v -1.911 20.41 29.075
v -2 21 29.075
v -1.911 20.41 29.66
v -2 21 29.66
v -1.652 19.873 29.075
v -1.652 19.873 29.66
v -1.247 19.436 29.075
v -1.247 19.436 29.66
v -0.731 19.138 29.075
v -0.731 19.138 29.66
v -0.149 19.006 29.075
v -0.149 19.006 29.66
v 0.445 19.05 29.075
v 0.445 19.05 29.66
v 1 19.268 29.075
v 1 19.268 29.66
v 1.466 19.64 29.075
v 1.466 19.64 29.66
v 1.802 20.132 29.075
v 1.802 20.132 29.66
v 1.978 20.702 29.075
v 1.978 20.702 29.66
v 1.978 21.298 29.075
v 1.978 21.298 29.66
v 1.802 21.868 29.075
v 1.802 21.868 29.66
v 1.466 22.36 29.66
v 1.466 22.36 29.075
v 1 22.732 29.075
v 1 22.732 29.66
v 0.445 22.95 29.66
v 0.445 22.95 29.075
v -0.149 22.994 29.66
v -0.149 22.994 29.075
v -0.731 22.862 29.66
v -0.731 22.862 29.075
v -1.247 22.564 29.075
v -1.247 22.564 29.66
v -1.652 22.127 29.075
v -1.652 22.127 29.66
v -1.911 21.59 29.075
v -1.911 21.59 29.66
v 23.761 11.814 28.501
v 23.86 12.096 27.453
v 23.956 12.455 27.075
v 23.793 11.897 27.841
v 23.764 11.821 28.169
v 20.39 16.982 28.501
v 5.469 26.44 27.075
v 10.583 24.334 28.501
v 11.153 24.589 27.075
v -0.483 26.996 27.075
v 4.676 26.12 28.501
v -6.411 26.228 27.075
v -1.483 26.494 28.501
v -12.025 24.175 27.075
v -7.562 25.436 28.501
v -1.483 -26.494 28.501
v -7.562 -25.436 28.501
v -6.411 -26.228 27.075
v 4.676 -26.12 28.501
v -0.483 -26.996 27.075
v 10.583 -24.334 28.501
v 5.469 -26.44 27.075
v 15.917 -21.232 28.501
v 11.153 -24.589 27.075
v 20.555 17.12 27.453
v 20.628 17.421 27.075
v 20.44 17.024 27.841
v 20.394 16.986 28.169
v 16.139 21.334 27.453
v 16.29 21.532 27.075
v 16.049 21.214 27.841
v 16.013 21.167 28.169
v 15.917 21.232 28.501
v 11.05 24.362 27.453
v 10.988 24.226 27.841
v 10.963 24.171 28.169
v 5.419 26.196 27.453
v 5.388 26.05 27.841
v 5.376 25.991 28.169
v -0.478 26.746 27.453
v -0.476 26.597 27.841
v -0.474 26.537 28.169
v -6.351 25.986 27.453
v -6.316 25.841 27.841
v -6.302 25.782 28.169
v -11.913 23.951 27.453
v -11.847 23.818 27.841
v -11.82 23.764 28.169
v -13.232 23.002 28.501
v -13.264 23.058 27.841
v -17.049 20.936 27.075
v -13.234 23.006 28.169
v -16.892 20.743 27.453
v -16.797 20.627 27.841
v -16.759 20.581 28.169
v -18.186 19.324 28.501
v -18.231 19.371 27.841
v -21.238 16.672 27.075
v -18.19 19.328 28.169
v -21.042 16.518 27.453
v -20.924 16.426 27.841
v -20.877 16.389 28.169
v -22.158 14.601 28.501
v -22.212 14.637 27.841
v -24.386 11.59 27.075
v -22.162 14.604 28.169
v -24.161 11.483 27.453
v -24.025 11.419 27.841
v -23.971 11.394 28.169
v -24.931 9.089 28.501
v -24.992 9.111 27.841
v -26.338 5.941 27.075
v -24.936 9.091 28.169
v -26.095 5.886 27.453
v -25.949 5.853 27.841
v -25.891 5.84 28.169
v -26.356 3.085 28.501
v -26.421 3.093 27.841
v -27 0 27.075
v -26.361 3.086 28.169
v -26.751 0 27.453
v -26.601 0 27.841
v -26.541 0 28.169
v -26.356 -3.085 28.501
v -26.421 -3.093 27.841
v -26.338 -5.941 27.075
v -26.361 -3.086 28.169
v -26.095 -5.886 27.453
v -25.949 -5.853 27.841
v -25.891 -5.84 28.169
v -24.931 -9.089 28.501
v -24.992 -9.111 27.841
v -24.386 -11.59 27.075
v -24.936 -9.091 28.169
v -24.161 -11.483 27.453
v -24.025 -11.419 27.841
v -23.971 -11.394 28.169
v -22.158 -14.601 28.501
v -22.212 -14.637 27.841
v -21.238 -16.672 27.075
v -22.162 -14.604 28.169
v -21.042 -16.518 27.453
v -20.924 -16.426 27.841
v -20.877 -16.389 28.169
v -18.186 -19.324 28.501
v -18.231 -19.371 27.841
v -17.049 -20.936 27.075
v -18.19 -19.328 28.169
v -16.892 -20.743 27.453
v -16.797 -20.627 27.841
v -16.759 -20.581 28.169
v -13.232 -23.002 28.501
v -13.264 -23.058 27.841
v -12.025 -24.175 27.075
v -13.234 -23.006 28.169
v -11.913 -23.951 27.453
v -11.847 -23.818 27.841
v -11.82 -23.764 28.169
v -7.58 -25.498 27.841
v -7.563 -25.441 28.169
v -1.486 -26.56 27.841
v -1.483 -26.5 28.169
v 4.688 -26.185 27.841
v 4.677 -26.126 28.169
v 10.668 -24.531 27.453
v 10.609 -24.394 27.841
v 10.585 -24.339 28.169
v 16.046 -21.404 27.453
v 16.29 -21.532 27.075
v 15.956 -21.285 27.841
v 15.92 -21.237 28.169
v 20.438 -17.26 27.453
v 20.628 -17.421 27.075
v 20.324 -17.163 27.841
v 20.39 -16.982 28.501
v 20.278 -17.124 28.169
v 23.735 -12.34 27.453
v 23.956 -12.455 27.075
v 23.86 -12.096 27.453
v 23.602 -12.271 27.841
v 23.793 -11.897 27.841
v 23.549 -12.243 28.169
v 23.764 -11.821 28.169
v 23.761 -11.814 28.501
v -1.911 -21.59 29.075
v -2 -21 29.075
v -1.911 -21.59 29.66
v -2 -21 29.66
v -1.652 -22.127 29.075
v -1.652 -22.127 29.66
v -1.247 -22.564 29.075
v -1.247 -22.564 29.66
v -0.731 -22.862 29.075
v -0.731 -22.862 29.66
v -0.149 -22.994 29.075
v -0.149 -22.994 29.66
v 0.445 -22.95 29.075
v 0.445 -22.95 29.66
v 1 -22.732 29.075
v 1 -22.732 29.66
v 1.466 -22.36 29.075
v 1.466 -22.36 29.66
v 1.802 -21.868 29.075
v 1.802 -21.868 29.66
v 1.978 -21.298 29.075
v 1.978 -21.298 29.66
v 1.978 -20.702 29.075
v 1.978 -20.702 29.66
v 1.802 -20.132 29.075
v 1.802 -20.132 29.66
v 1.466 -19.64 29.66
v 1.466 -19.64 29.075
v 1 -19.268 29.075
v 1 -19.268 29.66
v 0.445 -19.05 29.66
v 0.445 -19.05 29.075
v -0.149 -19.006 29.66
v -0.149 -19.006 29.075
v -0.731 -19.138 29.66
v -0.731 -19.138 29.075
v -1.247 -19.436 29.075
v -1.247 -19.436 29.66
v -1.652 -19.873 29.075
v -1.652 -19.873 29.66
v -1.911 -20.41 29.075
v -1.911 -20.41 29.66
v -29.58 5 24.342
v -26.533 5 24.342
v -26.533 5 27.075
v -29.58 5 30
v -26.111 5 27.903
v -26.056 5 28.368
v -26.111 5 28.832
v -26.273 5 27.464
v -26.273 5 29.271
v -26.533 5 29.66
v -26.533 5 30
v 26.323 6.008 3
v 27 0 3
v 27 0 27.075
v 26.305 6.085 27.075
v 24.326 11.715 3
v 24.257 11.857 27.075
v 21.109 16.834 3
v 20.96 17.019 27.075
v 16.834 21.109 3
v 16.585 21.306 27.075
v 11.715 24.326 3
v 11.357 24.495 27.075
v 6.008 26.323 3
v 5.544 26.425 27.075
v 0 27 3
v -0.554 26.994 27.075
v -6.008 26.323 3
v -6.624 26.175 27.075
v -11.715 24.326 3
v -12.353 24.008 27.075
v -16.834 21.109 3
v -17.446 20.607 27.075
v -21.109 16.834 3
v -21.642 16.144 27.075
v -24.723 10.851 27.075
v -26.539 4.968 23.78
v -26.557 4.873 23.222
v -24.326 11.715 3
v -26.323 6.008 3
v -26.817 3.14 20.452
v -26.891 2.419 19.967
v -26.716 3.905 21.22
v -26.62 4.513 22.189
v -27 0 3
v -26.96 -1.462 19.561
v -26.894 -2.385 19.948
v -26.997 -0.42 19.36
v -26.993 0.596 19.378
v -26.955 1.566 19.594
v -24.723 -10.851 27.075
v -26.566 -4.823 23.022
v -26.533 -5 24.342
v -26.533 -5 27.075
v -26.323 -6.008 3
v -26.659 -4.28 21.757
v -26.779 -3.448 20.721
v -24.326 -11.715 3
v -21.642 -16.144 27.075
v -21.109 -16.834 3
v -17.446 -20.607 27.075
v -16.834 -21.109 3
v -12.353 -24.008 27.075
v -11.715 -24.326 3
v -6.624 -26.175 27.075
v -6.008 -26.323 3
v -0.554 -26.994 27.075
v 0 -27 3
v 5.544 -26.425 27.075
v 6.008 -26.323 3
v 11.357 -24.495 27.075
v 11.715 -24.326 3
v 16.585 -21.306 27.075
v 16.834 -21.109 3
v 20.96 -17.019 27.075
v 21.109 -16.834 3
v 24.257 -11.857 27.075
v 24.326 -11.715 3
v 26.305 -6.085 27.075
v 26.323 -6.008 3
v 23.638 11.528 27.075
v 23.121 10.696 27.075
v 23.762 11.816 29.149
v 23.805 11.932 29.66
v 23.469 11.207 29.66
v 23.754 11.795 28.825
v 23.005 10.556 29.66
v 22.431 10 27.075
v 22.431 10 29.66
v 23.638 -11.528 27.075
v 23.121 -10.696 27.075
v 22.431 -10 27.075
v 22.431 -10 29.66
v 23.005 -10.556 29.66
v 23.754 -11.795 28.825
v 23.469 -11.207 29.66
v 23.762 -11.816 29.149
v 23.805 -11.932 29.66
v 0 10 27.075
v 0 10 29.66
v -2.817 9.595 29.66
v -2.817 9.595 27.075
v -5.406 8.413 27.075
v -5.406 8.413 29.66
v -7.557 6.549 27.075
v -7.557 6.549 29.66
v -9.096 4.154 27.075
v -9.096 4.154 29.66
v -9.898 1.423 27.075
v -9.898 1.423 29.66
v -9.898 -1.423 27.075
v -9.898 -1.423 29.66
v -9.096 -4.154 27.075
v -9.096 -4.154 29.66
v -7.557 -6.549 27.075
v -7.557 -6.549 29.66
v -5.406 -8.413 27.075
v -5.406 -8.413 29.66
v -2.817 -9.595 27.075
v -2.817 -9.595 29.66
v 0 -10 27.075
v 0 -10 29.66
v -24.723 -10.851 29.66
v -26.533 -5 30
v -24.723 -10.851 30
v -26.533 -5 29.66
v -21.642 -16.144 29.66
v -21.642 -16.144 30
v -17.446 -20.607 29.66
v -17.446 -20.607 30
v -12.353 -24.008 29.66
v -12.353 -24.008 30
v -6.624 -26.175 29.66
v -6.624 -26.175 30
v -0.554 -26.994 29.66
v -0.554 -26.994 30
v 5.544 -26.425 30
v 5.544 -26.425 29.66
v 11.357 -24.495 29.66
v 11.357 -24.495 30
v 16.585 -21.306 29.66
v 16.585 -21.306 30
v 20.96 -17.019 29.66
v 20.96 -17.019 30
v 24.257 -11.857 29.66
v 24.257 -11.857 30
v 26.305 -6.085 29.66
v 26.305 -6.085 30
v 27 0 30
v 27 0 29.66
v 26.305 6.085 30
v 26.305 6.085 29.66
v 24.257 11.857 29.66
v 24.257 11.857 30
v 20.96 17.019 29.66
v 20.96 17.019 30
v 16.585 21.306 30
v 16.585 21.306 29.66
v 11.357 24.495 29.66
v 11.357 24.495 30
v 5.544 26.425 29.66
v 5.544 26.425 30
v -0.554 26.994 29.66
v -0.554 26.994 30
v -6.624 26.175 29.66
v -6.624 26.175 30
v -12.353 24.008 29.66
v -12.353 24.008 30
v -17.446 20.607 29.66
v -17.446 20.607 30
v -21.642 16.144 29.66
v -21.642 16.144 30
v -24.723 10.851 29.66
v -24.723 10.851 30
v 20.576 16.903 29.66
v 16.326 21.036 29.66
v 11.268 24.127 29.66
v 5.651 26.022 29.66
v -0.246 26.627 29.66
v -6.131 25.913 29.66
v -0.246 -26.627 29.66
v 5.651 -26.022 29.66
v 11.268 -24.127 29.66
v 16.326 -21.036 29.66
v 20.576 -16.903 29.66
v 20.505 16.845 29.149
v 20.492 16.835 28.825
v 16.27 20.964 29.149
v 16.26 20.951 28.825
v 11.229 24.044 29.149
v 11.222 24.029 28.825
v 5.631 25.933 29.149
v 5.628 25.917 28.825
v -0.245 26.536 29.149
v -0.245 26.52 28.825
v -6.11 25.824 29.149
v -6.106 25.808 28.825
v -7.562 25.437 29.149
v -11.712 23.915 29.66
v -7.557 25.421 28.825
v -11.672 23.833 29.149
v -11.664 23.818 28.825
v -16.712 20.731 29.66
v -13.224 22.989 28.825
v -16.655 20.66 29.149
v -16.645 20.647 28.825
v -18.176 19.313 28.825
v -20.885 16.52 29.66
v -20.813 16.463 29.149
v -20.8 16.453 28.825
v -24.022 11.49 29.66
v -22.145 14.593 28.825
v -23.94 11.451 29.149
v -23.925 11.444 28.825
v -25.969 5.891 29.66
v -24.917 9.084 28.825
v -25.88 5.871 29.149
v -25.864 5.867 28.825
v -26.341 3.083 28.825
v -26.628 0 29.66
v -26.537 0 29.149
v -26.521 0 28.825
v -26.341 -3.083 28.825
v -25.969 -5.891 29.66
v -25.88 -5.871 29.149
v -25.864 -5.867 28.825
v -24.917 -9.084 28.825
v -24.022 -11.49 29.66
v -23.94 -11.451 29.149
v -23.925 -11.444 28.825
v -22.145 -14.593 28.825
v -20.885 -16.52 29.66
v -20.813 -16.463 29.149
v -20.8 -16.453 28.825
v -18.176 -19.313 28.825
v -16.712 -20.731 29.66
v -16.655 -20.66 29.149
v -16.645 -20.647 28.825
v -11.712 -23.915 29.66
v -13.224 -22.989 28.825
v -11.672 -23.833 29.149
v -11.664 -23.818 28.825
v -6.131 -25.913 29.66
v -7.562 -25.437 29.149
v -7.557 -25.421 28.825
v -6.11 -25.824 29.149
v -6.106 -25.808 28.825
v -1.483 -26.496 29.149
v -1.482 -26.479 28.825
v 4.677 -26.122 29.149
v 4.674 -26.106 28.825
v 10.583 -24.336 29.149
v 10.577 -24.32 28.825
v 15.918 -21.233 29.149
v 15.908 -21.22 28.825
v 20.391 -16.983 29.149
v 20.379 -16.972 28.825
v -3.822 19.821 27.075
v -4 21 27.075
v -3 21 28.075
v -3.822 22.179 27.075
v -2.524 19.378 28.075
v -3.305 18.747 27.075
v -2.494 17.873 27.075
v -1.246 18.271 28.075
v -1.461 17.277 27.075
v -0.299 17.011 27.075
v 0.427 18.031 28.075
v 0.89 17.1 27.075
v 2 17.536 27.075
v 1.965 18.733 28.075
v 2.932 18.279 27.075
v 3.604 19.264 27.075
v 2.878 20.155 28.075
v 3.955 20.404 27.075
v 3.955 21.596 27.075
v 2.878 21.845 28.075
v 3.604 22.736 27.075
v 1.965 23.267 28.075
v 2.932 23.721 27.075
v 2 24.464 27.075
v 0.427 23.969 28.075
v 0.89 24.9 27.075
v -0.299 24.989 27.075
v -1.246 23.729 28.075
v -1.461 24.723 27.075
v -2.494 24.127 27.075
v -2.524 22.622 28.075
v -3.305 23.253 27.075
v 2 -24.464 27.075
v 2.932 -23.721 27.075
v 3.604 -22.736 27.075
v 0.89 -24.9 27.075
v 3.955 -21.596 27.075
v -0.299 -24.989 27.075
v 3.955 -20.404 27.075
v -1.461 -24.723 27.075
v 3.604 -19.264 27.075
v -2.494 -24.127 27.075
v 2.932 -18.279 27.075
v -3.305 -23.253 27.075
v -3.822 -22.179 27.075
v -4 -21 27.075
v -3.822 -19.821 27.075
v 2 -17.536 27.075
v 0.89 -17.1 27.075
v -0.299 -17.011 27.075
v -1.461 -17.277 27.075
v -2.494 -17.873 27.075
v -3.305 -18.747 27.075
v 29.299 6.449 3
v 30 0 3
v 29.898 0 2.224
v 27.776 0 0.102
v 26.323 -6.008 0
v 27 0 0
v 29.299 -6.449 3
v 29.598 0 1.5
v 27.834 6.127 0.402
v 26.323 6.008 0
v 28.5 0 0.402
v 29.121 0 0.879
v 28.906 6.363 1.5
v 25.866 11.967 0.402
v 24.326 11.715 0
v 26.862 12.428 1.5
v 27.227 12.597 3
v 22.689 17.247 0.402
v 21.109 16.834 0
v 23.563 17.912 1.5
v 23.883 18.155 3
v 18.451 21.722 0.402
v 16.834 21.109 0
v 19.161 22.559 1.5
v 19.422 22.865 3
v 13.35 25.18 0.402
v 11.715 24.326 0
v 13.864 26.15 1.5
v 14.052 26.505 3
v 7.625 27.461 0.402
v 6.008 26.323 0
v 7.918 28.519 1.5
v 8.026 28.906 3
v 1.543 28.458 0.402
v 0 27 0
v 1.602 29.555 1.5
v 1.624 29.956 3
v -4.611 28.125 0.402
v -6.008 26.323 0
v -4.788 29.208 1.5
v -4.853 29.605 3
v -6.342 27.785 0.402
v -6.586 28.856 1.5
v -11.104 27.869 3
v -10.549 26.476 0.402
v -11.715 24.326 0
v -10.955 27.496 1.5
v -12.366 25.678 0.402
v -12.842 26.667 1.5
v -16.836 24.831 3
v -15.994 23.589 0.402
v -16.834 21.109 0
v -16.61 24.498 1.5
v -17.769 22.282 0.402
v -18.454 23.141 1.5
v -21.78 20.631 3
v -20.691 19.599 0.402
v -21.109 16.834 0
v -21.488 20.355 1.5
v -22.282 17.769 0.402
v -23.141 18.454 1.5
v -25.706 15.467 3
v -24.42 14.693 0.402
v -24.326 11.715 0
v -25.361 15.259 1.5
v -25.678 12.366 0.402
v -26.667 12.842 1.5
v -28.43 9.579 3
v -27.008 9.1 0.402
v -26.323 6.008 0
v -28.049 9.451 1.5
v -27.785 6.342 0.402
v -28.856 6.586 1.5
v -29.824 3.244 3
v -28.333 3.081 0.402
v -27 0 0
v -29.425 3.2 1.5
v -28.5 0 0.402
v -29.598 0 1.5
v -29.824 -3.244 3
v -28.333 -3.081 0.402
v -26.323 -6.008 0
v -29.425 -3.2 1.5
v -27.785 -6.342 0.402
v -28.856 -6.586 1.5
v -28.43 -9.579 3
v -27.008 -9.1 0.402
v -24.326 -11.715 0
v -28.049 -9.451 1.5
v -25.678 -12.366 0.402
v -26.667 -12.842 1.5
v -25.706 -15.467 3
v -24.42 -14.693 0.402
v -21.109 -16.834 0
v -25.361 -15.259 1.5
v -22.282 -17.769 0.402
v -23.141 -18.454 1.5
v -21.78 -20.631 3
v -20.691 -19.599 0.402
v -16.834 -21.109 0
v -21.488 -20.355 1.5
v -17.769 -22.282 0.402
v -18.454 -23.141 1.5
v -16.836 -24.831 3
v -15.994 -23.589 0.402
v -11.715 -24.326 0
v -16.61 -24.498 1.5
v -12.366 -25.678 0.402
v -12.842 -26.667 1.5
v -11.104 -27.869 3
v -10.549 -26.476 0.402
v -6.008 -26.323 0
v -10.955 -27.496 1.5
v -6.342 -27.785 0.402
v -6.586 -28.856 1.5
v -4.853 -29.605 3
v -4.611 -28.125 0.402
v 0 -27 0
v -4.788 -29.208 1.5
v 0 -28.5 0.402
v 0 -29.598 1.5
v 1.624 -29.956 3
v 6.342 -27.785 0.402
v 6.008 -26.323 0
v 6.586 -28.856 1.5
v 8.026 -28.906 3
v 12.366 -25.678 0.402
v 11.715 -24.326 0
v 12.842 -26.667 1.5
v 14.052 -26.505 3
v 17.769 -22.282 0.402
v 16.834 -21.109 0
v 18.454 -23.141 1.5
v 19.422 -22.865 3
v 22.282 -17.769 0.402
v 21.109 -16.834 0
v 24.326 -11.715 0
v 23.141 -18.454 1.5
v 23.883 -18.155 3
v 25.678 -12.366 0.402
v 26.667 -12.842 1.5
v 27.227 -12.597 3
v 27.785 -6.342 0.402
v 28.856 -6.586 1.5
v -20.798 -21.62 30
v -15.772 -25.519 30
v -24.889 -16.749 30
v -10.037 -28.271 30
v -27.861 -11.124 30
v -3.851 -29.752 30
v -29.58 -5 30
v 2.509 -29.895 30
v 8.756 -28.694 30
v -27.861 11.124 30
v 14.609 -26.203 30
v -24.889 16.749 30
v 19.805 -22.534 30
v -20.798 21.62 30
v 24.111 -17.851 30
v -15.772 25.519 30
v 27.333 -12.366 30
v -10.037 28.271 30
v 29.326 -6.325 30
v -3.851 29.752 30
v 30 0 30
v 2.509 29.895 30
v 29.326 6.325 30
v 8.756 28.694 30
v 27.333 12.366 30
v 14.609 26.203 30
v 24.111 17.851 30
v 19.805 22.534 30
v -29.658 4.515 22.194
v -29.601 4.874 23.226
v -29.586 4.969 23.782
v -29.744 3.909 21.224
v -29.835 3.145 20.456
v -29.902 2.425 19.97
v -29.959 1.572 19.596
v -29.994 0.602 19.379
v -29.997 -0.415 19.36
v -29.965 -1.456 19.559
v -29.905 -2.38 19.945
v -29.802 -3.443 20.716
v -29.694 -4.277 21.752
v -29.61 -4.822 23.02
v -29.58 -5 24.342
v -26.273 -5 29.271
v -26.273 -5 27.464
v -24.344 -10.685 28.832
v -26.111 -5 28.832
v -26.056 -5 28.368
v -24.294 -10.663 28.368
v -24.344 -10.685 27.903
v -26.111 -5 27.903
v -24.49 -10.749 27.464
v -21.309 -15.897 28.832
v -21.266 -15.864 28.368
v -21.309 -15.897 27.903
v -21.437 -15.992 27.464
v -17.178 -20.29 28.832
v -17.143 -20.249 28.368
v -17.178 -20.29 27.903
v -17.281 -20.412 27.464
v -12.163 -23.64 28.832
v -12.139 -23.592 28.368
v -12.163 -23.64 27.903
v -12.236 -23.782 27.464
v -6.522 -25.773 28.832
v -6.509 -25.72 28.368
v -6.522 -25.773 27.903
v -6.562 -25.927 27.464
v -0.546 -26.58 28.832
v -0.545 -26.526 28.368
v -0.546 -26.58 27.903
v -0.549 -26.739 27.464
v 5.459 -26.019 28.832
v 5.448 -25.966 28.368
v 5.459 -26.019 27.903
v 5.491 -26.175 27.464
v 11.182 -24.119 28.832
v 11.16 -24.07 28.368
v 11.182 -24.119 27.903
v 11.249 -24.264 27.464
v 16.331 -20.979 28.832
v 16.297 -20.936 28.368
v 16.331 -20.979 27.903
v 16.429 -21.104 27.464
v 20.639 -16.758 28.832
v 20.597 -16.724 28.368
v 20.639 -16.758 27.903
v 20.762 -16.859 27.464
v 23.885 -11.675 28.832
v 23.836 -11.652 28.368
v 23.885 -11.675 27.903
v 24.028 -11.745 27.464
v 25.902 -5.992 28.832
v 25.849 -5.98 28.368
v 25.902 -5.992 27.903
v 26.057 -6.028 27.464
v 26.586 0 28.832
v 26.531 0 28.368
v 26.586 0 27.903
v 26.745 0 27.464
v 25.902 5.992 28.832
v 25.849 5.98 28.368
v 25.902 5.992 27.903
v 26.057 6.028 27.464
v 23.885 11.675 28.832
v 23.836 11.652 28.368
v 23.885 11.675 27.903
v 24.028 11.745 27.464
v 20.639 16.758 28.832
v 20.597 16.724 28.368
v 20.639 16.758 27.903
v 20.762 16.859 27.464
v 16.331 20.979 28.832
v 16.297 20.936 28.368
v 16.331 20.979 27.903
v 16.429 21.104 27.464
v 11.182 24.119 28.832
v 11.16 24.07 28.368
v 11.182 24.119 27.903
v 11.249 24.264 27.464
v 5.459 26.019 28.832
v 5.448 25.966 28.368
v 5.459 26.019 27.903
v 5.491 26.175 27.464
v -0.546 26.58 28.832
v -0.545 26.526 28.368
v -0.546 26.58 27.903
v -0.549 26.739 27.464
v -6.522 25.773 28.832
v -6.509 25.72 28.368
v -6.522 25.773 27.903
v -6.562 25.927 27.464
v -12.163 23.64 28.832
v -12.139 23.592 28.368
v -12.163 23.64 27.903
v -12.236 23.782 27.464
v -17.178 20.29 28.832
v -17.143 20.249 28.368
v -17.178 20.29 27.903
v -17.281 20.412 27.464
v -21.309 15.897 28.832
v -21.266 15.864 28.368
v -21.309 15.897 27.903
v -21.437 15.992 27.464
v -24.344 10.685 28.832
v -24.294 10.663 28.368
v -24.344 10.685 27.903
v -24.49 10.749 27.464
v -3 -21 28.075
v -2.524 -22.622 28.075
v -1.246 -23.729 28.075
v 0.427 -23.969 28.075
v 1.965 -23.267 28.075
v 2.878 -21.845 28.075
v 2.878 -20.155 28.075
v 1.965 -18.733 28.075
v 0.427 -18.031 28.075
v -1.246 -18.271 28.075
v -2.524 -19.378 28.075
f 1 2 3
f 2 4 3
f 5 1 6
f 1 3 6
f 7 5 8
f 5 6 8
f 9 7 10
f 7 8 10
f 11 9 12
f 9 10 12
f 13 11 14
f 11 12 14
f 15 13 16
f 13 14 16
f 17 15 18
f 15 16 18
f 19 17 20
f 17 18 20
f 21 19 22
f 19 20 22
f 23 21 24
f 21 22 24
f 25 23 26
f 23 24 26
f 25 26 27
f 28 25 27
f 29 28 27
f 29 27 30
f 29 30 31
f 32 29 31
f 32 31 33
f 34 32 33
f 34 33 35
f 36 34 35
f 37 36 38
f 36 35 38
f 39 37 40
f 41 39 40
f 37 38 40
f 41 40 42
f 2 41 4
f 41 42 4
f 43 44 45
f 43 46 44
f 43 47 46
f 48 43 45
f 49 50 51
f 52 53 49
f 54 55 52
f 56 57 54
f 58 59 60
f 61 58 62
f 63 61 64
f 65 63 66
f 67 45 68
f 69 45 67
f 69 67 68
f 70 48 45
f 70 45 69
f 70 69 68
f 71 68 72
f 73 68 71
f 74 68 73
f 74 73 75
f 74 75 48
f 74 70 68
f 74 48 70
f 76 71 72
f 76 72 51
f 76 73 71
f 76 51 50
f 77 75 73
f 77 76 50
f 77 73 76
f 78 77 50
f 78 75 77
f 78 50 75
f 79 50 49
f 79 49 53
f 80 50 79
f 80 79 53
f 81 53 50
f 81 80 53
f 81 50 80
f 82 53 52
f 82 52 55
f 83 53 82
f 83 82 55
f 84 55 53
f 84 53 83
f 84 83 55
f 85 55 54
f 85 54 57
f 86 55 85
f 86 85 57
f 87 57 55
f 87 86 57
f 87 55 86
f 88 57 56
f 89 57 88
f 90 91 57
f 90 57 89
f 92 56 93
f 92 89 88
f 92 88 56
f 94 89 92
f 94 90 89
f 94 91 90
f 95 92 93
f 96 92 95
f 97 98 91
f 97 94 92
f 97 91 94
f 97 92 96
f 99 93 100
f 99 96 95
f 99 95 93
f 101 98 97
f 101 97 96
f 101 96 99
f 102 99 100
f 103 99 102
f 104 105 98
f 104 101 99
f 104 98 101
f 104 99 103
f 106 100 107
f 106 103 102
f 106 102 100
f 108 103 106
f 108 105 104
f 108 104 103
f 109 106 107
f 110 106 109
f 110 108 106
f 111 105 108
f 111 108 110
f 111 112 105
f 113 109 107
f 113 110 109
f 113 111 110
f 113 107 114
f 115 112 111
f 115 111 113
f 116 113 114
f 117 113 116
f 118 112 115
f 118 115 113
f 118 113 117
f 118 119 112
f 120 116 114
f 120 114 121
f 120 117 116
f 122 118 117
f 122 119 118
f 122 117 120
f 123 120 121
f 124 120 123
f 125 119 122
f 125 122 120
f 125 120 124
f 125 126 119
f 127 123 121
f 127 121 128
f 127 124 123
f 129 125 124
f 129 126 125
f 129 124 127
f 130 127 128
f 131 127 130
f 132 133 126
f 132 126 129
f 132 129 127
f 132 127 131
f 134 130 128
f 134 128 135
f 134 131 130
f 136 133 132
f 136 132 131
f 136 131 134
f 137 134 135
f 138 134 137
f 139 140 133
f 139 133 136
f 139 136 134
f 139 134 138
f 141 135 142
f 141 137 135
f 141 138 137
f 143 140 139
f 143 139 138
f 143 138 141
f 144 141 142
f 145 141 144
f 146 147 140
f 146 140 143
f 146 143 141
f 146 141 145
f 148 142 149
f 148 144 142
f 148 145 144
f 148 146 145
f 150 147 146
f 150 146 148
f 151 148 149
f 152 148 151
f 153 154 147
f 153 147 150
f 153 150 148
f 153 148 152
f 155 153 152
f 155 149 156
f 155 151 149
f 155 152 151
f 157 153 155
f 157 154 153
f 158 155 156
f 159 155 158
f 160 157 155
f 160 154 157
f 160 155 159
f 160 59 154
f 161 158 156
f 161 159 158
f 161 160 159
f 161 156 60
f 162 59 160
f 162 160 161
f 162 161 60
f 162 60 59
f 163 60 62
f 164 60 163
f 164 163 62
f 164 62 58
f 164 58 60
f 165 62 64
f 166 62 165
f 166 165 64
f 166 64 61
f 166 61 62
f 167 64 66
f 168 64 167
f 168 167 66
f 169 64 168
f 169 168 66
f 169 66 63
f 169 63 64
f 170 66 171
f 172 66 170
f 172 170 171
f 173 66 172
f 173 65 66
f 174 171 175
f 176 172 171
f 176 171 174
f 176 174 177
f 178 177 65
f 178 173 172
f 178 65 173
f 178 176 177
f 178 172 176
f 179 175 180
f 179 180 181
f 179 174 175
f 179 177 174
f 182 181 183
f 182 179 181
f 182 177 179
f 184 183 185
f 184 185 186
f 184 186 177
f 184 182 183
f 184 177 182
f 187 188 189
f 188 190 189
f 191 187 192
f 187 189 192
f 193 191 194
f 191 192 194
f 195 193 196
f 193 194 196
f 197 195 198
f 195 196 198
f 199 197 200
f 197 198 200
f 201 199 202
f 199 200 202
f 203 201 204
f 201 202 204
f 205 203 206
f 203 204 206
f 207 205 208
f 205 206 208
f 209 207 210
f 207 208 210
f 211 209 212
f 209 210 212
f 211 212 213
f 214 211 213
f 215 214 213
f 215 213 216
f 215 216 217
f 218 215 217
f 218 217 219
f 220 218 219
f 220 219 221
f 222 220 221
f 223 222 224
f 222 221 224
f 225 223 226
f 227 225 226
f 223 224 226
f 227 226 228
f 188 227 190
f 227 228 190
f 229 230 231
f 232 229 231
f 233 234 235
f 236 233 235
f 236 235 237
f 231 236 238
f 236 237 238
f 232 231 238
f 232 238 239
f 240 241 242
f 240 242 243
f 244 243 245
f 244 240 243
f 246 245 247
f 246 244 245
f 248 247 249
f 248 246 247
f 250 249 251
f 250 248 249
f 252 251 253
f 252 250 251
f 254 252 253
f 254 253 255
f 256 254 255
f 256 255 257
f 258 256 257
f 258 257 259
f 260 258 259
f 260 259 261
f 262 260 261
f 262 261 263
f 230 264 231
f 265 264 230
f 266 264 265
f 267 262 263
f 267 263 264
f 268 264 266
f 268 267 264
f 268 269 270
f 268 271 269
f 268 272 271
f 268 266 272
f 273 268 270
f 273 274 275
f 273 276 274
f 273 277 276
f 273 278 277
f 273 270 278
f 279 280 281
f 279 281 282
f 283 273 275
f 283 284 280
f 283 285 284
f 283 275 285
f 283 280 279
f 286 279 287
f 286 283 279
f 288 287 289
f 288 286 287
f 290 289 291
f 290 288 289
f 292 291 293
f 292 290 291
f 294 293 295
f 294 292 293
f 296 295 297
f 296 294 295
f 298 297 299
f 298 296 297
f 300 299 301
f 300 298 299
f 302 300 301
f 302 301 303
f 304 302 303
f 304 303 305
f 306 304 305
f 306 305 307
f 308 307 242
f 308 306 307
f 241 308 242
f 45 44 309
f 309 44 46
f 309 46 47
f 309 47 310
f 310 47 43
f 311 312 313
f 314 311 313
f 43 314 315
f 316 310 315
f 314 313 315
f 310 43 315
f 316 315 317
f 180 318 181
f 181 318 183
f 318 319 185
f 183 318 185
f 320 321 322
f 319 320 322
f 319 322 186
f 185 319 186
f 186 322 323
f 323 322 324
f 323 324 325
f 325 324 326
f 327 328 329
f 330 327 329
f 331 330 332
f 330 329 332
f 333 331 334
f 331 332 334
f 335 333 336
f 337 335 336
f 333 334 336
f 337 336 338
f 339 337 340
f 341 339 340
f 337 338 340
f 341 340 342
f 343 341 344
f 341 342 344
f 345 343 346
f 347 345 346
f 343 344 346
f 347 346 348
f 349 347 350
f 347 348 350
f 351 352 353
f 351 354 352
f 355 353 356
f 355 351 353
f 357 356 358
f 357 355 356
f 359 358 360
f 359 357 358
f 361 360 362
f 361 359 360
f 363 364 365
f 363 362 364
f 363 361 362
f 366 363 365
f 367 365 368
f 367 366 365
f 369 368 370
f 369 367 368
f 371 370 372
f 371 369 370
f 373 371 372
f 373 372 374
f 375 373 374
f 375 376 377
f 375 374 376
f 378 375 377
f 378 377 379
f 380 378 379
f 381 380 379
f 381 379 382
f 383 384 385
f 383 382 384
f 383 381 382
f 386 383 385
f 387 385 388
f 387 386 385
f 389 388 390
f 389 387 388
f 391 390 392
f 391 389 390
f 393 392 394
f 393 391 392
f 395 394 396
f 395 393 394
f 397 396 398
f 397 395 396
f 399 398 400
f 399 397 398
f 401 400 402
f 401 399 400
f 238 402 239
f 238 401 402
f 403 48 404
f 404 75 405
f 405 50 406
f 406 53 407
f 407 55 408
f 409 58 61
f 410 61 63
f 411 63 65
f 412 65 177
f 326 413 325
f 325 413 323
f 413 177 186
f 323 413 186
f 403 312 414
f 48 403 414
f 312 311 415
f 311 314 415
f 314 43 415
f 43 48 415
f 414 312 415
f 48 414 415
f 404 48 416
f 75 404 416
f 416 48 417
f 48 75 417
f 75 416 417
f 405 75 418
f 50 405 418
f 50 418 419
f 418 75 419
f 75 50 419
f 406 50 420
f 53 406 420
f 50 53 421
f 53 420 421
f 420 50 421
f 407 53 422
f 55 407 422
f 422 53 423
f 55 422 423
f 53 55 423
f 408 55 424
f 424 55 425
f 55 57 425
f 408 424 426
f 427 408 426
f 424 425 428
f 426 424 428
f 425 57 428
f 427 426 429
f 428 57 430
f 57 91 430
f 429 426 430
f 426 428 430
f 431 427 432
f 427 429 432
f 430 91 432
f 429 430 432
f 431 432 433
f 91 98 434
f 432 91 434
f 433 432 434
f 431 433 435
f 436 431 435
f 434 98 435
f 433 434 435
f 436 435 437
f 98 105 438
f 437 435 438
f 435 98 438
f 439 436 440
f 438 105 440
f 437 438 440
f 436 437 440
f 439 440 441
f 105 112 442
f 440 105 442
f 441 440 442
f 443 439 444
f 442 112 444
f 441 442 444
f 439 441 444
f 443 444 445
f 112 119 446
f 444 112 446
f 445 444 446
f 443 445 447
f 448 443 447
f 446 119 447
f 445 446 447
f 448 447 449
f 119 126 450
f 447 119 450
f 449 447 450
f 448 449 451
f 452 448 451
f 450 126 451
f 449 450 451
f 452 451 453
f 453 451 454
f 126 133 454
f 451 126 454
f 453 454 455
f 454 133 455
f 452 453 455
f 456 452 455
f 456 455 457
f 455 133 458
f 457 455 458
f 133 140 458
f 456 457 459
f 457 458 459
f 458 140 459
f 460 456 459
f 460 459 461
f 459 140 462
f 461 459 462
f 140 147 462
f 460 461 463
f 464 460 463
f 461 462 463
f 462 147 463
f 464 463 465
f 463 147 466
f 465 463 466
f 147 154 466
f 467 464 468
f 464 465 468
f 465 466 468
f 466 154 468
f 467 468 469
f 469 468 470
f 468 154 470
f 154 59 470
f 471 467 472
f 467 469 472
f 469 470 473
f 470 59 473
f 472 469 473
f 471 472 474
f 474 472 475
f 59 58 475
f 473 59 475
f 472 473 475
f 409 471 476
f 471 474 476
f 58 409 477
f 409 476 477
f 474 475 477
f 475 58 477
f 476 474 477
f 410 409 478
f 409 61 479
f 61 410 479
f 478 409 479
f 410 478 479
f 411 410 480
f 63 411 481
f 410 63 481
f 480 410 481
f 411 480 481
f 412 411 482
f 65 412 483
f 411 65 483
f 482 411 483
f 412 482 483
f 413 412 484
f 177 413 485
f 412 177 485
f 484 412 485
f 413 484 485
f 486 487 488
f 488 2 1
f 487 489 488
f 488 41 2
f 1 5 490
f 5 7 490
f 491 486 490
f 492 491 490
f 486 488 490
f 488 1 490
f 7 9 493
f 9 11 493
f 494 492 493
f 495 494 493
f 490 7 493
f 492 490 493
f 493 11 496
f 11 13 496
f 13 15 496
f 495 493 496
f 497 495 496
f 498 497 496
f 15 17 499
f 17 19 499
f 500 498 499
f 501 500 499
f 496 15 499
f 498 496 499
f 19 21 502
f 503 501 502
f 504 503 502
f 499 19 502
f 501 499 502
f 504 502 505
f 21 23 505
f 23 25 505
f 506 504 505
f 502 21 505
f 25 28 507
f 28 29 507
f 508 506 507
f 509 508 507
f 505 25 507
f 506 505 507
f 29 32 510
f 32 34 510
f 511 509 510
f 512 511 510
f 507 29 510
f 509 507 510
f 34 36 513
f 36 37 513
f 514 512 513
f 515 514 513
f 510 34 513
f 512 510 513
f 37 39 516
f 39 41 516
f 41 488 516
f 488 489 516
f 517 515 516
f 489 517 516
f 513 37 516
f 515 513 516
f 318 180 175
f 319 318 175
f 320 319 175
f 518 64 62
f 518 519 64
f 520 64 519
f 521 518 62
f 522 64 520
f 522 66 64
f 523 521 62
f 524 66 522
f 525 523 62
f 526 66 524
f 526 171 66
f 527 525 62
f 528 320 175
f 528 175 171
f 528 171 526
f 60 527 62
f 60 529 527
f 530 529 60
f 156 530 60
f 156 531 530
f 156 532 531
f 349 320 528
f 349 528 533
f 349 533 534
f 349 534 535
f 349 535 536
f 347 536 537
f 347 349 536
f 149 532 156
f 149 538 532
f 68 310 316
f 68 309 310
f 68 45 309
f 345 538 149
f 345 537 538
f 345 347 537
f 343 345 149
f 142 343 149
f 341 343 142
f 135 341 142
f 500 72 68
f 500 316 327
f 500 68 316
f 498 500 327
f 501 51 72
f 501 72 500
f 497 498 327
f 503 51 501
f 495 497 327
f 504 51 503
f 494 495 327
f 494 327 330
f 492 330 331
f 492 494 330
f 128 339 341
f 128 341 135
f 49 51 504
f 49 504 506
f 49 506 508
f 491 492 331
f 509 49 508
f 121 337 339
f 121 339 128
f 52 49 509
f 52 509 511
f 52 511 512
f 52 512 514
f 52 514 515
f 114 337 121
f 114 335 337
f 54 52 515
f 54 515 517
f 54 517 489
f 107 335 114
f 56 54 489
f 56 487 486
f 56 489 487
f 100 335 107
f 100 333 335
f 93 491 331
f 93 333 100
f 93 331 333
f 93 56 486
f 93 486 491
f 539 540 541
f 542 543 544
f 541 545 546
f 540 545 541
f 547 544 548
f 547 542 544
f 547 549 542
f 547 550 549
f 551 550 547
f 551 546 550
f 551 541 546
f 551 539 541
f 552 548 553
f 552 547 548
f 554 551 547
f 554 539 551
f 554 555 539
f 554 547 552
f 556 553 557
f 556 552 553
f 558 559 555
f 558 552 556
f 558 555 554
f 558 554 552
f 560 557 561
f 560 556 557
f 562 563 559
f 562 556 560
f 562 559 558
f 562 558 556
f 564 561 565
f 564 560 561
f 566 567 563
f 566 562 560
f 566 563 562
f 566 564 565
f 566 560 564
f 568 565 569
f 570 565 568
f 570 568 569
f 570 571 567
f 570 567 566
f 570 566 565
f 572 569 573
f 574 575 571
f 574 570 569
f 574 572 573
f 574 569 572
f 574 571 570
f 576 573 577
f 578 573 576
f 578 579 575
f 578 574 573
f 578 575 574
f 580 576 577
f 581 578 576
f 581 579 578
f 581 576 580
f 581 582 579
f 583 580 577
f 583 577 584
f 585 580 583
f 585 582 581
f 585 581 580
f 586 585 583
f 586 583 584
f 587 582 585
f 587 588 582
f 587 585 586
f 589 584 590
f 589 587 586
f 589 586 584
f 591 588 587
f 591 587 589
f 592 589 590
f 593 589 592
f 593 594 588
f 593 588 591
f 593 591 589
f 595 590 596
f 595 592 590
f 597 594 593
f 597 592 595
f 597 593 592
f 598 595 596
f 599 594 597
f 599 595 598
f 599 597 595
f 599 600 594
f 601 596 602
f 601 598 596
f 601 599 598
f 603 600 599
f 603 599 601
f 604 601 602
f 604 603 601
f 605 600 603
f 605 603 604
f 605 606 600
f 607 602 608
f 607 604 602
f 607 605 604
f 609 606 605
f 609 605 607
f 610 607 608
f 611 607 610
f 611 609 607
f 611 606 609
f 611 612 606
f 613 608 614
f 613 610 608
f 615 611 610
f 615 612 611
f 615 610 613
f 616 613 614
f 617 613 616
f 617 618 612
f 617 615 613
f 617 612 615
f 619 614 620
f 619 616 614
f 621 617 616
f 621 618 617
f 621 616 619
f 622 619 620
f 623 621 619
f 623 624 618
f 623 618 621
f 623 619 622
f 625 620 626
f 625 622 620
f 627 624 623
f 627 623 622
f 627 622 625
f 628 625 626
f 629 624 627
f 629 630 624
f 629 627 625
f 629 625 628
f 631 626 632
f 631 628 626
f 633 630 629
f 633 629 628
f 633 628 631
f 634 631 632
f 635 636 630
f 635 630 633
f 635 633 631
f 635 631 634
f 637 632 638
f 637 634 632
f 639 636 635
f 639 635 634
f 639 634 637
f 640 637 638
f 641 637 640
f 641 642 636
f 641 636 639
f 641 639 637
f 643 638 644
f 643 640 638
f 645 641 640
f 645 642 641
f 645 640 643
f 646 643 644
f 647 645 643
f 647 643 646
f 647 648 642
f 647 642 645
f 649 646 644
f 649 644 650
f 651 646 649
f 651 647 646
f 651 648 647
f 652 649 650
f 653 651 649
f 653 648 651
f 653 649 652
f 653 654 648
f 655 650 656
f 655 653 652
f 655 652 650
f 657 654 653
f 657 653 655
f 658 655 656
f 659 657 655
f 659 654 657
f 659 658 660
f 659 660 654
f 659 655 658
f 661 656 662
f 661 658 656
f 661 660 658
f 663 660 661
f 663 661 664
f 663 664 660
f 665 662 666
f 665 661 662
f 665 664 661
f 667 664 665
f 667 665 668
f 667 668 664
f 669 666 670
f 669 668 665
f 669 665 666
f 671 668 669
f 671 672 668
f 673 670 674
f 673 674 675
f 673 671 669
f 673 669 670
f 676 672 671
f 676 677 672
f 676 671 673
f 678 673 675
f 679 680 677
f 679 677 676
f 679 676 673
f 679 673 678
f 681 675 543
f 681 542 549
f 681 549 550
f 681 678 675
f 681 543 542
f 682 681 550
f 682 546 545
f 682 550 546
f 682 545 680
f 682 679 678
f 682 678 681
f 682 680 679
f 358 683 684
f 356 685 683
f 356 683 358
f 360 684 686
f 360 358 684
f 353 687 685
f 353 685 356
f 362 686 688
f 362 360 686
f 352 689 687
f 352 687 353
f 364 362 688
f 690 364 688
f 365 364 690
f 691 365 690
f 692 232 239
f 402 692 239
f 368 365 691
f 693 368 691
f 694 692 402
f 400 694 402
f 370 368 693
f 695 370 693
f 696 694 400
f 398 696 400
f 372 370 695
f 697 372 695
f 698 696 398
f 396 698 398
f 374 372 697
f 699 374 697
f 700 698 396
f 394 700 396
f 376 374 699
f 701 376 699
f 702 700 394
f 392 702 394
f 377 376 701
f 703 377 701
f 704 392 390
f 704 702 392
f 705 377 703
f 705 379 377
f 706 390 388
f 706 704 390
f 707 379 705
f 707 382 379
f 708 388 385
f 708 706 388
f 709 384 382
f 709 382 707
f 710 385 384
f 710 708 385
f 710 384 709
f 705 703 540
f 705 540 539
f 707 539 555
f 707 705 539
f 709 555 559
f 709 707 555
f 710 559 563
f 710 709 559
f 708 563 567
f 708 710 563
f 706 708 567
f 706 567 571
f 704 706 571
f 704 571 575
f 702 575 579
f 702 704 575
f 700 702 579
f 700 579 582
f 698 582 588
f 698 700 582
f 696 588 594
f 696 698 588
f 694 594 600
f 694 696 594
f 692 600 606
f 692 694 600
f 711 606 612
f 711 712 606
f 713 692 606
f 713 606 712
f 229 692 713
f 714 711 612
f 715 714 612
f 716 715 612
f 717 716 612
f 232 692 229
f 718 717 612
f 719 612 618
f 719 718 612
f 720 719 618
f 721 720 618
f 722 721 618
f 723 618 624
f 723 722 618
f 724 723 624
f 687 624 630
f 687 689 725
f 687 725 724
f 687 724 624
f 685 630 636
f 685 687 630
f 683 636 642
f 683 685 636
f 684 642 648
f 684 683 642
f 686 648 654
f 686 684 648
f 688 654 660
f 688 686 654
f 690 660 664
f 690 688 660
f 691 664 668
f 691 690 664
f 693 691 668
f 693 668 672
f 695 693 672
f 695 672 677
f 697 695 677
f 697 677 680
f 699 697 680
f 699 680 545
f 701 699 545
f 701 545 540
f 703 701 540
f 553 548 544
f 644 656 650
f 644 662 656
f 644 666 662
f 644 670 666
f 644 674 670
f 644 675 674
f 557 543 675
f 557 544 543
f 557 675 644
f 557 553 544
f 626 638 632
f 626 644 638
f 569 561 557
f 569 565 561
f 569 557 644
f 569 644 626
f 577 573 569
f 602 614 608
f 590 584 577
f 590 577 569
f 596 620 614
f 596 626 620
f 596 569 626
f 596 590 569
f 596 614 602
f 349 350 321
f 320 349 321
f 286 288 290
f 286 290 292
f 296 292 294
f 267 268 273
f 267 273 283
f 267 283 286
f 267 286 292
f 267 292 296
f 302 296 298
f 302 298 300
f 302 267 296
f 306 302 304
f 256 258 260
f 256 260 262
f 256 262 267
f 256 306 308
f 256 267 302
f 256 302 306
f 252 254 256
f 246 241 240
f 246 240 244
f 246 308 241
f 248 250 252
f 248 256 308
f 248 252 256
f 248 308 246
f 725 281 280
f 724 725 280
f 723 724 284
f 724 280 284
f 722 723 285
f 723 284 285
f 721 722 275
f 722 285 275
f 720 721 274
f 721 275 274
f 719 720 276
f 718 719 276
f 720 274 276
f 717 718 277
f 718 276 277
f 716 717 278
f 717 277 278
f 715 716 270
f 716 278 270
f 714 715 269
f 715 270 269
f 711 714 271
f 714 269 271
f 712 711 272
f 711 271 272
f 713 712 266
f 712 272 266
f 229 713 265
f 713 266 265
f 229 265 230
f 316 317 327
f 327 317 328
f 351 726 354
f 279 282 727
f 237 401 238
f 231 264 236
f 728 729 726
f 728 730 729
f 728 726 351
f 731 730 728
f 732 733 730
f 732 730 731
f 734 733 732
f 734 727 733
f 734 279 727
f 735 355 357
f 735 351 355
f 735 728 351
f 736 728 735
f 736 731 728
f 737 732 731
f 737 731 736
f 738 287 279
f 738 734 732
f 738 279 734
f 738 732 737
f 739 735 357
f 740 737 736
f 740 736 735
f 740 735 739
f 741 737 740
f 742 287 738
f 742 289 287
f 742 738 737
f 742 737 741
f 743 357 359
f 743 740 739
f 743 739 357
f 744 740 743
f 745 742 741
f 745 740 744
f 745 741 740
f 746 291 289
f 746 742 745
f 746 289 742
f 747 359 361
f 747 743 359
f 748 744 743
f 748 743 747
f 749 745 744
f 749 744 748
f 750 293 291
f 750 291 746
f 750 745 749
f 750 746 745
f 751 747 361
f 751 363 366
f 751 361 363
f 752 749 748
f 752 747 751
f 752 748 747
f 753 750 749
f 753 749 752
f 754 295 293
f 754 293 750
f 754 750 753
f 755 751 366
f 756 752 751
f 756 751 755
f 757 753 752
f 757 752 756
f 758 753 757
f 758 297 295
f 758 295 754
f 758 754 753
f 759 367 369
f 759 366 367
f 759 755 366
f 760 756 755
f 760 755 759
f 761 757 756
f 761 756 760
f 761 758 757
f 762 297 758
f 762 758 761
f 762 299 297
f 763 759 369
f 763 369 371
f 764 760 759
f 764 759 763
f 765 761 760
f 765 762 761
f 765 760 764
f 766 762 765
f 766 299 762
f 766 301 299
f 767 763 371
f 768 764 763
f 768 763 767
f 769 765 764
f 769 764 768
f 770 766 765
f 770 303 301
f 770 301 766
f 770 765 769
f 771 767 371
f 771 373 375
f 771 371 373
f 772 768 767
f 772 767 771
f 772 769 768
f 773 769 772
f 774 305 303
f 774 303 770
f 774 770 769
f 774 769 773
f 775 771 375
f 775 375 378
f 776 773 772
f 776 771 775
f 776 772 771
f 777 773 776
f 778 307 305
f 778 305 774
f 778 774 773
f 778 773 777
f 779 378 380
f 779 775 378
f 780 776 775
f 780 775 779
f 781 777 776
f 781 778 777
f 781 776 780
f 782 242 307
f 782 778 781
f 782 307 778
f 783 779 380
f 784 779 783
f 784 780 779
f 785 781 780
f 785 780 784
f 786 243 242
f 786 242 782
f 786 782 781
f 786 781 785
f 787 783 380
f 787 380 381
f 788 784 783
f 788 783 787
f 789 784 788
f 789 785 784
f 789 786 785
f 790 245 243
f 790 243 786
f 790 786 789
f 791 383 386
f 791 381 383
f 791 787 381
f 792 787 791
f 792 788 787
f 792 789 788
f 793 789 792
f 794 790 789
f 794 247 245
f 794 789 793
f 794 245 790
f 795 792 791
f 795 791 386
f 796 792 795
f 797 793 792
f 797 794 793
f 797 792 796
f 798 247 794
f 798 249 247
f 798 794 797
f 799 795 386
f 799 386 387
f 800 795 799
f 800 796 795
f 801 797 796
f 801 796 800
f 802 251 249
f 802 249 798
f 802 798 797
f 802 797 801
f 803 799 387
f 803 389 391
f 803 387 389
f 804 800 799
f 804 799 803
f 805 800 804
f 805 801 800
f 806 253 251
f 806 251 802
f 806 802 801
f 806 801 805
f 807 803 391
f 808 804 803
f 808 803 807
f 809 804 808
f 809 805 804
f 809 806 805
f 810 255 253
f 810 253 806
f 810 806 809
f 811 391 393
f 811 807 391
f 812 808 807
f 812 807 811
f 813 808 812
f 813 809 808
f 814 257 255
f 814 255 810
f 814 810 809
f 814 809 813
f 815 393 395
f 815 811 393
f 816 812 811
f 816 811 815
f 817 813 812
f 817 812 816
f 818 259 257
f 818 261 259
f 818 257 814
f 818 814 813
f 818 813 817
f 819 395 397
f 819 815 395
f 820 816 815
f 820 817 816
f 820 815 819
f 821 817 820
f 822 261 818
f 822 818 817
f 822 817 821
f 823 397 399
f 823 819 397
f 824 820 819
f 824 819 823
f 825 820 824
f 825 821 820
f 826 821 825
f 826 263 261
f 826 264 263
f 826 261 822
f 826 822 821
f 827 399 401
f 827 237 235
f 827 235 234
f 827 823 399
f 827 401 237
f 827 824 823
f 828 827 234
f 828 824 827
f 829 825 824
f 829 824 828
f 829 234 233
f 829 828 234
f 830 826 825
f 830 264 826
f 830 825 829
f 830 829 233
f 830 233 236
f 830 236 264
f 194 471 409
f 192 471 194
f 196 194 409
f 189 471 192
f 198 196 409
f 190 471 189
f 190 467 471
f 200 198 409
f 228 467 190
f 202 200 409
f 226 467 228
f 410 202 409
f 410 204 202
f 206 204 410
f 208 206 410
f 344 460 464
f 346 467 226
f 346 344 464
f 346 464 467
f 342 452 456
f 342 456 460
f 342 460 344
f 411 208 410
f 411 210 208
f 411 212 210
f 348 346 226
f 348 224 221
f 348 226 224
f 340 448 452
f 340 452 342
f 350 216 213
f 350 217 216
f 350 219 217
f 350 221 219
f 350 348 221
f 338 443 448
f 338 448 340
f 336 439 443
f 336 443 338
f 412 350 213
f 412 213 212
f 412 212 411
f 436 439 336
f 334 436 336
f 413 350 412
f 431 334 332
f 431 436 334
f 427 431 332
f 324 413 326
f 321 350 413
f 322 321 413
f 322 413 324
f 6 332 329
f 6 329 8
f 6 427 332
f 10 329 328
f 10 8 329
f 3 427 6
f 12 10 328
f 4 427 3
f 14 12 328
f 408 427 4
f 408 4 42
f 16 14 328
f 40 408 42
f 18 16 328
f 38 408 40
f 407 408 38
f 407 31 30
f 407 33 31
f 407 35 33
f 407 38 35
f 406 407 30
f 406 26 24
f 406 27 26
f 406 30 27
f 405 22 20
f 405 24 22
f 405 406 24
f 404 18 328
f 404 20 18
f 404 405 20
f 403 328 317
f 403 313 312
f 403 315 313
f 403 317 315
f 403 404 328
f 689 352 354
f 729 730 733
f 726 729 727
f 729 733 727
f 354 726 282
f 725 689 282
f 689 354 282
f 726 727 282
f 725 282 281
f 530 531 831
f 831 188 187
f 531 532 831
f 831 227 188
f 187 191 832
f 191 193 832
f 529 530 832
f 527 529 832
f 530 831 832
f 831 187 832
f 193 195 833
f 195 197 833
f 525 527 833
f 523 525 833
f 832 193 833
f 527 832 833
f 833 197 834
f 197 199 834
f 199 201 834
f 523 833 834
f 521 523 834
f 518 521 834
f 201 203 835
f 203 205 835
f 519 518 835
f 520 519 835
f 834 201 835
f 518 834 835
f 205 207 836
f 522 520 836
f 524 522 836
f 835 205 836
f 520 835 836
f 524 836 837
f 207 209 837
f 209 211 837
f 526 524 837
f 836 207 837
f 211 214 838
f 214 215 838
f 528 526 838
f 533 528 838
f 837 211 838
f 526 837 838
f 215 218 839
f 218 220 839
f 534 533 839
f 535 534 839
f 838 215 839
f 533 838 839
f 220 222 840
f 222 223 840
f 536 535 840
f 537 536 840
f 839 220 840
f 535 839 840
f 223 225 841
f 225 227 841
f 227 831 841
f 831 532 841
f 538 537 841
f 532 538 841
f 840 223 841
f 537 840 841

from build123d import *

# Parameters (mm, degrees)
F7_DEPTH        = 25
F9_DEPTH        = 25
F11_D           = 4
F11_CSINK_D     = 8
F11_CSINK_ANGLE = 90
F13_DEPTH       = 30.001


# Not quite as in the source:
# - a feature of the source that left no trace in its solid (it failed there, or was rolled back) is left out


with BuildPart() as f1:
    # F0 (on Front) → F1 (revolve)
    with BuildSketch(Plane.XZ):
        with BuildLine():
            Line((0, 3), (0, 0))
            Line((0, 0), (27, 0))
            ThreePointArc((27, 0), (29.1213203436, 0.8786796564), (30, 3))
            Line((30, 3), (30, 30))
            Line((30, 30), (27, 30))
            Line((27, 30), (27, 29.659981063))
            ThreePointArc((27, 29.659981063), (26.5313694768, 28.3675268292), (27, 27.0750725955))
            Line((27, 27.0750725955), (27, 3))
            Line((27, 3), (0, 3))
        make_face()
    revolve(axis=Axis((0, 0, 20.7135844976), (0, 0, 1)))

    # F12 (on Right) → F13 (cut, through all)
    with BuildSketch(Plane.YZ):
        with BuildLine():
            Line((5, 24.3423475833), (5, 32.1951069077))
            Line((5, 32.1951069077), (-5, 32.5018552183))
            Line((-5, 32.5018552183), (-5, 24.3423475833))
            ThreePointArc((-5, 24.3423475833), (0, 19.3423475833), (5, 24.3423475833))
        make_face()
    extrude(amount=-F13_DEPTH, mode=Mode.SUBTRACT)


with BuildPart() as f2:
    # F0 (on Front) → F2 (revolve)
    with BuildSketch(Plane.XZ):
        with BuildLine():
            Line((0, 27.0750725955), (27, 27.0750725955))
            ThreePointArc((27, 27.0750725955), (26.5313694768, 28.3675268292), (27, 29.659981063))
            Line((27, 29.659981063), (0, 29.659981063))
            Line((0, 29.659981063), (0, 27.0750725955))
        make_face()
    revolve(axis=Axis((0, 0, 20.7135844976), (0, 0, 1)))

    # F4 (on Front) → F5 (revolve, cut)
    with BuildSketch(Plane.XZ):
        with BuildLine():
            Line((27.2429585457, 29.4521301985), (27.0748790354, 30.6622516364))
            ThreePointArc((27.0748790354, 30.6622516364), (26.5911281972, 29.5003878586), (26.570642367, 28.2420068979))
            Line((26.570642367, 28.2420068979), (27.2429585457, 29.4521301985))
        make_face()
    revolve(axis=Axis((0, 0, 20.7135844976), (0, 0, 1)), mode=Mode.SUBTRACT)

    # F6 (on face) → F7 (cut)
    with BuildSketch(Plane.XY.offset(29.659981063)):
        with BuildLine():
            ThreePointArc((0, -10), (7.0710678119, -7.0710678119), (10, 0))
            ThreePointArc((10, 0), (7.0710678119, 7.0710678119), (0, 10))
            ThreePointArc((0, 10), (-10, 0), (0, -10))
        make_face()
        with BuildLine():
            ThreePointArc((0, 10), (7.0710678119, 7.0710678119), (10, 0))
            ThreePointArc((10, 0), (7.0710678119, -7.0710678119), (0, -10))
            Line((0, -10), (44.3025864661, -10))
            Line((44.3025864661, -10), (43.6370521784, 10))
            Line((43.6370521784, 10), (0, 10))
        make_face()
    extrude(amount=-F7_DEPTH, mode=Mode.SUBTRACT)

    # F8 (on face) → F9 (cut)
    with BuildSketch(Plane.XY.offset(29.659981063)):
        with BuildLine():
            ThreePointArc((23.9879842848, 14.1842635348), (22.7204724664, 10.2545780002), (18.7441203743, 9.1420859098))
            Line((18.7441203743, 9.1420859098), (19.8477320373, 7.0414338261))
            Line((19.8477320373, 7.0414338261), (30.4011907429, 7.6118907891))
            Line((30.4011907429, 7.6118907891), (23.9879842848, 14.1842635348))
        make_face()
        with BuildLine():
            Line((19.8477320373, -7.0414338261), (18.7441203743, -9.1420859098))
            ThreePointArc((18.7441203743, -9.1420859098), (22.7204724664, -10.2545780002), (23.9879842848, -14.1842635348))
            Line((23.9879842848, -14.1842635348), (30.4011907429, -7.6118907891))
            Line((30.4011907429, -7.6118907891), (19.8477320373, -7.0414338261))
        make_face()
    extrude(amount=-F9_DEPTH, mode=Mode.SUBTRACT)

    # F11 (through all)
    with Locations(Plane(origin=(0, 0, 27.0750725955), x_dir=(1, 0, 0), z_dir=(0, 0, -1))):
        with Locations((0, 21), (0, -21)):
            CounterSinkHole(F11_D / 2, F11_CSINK_D / 2, counter_sink_angle=F11_CSINK_ANGLE)


solid = Compound([f1.part, f2.part])
